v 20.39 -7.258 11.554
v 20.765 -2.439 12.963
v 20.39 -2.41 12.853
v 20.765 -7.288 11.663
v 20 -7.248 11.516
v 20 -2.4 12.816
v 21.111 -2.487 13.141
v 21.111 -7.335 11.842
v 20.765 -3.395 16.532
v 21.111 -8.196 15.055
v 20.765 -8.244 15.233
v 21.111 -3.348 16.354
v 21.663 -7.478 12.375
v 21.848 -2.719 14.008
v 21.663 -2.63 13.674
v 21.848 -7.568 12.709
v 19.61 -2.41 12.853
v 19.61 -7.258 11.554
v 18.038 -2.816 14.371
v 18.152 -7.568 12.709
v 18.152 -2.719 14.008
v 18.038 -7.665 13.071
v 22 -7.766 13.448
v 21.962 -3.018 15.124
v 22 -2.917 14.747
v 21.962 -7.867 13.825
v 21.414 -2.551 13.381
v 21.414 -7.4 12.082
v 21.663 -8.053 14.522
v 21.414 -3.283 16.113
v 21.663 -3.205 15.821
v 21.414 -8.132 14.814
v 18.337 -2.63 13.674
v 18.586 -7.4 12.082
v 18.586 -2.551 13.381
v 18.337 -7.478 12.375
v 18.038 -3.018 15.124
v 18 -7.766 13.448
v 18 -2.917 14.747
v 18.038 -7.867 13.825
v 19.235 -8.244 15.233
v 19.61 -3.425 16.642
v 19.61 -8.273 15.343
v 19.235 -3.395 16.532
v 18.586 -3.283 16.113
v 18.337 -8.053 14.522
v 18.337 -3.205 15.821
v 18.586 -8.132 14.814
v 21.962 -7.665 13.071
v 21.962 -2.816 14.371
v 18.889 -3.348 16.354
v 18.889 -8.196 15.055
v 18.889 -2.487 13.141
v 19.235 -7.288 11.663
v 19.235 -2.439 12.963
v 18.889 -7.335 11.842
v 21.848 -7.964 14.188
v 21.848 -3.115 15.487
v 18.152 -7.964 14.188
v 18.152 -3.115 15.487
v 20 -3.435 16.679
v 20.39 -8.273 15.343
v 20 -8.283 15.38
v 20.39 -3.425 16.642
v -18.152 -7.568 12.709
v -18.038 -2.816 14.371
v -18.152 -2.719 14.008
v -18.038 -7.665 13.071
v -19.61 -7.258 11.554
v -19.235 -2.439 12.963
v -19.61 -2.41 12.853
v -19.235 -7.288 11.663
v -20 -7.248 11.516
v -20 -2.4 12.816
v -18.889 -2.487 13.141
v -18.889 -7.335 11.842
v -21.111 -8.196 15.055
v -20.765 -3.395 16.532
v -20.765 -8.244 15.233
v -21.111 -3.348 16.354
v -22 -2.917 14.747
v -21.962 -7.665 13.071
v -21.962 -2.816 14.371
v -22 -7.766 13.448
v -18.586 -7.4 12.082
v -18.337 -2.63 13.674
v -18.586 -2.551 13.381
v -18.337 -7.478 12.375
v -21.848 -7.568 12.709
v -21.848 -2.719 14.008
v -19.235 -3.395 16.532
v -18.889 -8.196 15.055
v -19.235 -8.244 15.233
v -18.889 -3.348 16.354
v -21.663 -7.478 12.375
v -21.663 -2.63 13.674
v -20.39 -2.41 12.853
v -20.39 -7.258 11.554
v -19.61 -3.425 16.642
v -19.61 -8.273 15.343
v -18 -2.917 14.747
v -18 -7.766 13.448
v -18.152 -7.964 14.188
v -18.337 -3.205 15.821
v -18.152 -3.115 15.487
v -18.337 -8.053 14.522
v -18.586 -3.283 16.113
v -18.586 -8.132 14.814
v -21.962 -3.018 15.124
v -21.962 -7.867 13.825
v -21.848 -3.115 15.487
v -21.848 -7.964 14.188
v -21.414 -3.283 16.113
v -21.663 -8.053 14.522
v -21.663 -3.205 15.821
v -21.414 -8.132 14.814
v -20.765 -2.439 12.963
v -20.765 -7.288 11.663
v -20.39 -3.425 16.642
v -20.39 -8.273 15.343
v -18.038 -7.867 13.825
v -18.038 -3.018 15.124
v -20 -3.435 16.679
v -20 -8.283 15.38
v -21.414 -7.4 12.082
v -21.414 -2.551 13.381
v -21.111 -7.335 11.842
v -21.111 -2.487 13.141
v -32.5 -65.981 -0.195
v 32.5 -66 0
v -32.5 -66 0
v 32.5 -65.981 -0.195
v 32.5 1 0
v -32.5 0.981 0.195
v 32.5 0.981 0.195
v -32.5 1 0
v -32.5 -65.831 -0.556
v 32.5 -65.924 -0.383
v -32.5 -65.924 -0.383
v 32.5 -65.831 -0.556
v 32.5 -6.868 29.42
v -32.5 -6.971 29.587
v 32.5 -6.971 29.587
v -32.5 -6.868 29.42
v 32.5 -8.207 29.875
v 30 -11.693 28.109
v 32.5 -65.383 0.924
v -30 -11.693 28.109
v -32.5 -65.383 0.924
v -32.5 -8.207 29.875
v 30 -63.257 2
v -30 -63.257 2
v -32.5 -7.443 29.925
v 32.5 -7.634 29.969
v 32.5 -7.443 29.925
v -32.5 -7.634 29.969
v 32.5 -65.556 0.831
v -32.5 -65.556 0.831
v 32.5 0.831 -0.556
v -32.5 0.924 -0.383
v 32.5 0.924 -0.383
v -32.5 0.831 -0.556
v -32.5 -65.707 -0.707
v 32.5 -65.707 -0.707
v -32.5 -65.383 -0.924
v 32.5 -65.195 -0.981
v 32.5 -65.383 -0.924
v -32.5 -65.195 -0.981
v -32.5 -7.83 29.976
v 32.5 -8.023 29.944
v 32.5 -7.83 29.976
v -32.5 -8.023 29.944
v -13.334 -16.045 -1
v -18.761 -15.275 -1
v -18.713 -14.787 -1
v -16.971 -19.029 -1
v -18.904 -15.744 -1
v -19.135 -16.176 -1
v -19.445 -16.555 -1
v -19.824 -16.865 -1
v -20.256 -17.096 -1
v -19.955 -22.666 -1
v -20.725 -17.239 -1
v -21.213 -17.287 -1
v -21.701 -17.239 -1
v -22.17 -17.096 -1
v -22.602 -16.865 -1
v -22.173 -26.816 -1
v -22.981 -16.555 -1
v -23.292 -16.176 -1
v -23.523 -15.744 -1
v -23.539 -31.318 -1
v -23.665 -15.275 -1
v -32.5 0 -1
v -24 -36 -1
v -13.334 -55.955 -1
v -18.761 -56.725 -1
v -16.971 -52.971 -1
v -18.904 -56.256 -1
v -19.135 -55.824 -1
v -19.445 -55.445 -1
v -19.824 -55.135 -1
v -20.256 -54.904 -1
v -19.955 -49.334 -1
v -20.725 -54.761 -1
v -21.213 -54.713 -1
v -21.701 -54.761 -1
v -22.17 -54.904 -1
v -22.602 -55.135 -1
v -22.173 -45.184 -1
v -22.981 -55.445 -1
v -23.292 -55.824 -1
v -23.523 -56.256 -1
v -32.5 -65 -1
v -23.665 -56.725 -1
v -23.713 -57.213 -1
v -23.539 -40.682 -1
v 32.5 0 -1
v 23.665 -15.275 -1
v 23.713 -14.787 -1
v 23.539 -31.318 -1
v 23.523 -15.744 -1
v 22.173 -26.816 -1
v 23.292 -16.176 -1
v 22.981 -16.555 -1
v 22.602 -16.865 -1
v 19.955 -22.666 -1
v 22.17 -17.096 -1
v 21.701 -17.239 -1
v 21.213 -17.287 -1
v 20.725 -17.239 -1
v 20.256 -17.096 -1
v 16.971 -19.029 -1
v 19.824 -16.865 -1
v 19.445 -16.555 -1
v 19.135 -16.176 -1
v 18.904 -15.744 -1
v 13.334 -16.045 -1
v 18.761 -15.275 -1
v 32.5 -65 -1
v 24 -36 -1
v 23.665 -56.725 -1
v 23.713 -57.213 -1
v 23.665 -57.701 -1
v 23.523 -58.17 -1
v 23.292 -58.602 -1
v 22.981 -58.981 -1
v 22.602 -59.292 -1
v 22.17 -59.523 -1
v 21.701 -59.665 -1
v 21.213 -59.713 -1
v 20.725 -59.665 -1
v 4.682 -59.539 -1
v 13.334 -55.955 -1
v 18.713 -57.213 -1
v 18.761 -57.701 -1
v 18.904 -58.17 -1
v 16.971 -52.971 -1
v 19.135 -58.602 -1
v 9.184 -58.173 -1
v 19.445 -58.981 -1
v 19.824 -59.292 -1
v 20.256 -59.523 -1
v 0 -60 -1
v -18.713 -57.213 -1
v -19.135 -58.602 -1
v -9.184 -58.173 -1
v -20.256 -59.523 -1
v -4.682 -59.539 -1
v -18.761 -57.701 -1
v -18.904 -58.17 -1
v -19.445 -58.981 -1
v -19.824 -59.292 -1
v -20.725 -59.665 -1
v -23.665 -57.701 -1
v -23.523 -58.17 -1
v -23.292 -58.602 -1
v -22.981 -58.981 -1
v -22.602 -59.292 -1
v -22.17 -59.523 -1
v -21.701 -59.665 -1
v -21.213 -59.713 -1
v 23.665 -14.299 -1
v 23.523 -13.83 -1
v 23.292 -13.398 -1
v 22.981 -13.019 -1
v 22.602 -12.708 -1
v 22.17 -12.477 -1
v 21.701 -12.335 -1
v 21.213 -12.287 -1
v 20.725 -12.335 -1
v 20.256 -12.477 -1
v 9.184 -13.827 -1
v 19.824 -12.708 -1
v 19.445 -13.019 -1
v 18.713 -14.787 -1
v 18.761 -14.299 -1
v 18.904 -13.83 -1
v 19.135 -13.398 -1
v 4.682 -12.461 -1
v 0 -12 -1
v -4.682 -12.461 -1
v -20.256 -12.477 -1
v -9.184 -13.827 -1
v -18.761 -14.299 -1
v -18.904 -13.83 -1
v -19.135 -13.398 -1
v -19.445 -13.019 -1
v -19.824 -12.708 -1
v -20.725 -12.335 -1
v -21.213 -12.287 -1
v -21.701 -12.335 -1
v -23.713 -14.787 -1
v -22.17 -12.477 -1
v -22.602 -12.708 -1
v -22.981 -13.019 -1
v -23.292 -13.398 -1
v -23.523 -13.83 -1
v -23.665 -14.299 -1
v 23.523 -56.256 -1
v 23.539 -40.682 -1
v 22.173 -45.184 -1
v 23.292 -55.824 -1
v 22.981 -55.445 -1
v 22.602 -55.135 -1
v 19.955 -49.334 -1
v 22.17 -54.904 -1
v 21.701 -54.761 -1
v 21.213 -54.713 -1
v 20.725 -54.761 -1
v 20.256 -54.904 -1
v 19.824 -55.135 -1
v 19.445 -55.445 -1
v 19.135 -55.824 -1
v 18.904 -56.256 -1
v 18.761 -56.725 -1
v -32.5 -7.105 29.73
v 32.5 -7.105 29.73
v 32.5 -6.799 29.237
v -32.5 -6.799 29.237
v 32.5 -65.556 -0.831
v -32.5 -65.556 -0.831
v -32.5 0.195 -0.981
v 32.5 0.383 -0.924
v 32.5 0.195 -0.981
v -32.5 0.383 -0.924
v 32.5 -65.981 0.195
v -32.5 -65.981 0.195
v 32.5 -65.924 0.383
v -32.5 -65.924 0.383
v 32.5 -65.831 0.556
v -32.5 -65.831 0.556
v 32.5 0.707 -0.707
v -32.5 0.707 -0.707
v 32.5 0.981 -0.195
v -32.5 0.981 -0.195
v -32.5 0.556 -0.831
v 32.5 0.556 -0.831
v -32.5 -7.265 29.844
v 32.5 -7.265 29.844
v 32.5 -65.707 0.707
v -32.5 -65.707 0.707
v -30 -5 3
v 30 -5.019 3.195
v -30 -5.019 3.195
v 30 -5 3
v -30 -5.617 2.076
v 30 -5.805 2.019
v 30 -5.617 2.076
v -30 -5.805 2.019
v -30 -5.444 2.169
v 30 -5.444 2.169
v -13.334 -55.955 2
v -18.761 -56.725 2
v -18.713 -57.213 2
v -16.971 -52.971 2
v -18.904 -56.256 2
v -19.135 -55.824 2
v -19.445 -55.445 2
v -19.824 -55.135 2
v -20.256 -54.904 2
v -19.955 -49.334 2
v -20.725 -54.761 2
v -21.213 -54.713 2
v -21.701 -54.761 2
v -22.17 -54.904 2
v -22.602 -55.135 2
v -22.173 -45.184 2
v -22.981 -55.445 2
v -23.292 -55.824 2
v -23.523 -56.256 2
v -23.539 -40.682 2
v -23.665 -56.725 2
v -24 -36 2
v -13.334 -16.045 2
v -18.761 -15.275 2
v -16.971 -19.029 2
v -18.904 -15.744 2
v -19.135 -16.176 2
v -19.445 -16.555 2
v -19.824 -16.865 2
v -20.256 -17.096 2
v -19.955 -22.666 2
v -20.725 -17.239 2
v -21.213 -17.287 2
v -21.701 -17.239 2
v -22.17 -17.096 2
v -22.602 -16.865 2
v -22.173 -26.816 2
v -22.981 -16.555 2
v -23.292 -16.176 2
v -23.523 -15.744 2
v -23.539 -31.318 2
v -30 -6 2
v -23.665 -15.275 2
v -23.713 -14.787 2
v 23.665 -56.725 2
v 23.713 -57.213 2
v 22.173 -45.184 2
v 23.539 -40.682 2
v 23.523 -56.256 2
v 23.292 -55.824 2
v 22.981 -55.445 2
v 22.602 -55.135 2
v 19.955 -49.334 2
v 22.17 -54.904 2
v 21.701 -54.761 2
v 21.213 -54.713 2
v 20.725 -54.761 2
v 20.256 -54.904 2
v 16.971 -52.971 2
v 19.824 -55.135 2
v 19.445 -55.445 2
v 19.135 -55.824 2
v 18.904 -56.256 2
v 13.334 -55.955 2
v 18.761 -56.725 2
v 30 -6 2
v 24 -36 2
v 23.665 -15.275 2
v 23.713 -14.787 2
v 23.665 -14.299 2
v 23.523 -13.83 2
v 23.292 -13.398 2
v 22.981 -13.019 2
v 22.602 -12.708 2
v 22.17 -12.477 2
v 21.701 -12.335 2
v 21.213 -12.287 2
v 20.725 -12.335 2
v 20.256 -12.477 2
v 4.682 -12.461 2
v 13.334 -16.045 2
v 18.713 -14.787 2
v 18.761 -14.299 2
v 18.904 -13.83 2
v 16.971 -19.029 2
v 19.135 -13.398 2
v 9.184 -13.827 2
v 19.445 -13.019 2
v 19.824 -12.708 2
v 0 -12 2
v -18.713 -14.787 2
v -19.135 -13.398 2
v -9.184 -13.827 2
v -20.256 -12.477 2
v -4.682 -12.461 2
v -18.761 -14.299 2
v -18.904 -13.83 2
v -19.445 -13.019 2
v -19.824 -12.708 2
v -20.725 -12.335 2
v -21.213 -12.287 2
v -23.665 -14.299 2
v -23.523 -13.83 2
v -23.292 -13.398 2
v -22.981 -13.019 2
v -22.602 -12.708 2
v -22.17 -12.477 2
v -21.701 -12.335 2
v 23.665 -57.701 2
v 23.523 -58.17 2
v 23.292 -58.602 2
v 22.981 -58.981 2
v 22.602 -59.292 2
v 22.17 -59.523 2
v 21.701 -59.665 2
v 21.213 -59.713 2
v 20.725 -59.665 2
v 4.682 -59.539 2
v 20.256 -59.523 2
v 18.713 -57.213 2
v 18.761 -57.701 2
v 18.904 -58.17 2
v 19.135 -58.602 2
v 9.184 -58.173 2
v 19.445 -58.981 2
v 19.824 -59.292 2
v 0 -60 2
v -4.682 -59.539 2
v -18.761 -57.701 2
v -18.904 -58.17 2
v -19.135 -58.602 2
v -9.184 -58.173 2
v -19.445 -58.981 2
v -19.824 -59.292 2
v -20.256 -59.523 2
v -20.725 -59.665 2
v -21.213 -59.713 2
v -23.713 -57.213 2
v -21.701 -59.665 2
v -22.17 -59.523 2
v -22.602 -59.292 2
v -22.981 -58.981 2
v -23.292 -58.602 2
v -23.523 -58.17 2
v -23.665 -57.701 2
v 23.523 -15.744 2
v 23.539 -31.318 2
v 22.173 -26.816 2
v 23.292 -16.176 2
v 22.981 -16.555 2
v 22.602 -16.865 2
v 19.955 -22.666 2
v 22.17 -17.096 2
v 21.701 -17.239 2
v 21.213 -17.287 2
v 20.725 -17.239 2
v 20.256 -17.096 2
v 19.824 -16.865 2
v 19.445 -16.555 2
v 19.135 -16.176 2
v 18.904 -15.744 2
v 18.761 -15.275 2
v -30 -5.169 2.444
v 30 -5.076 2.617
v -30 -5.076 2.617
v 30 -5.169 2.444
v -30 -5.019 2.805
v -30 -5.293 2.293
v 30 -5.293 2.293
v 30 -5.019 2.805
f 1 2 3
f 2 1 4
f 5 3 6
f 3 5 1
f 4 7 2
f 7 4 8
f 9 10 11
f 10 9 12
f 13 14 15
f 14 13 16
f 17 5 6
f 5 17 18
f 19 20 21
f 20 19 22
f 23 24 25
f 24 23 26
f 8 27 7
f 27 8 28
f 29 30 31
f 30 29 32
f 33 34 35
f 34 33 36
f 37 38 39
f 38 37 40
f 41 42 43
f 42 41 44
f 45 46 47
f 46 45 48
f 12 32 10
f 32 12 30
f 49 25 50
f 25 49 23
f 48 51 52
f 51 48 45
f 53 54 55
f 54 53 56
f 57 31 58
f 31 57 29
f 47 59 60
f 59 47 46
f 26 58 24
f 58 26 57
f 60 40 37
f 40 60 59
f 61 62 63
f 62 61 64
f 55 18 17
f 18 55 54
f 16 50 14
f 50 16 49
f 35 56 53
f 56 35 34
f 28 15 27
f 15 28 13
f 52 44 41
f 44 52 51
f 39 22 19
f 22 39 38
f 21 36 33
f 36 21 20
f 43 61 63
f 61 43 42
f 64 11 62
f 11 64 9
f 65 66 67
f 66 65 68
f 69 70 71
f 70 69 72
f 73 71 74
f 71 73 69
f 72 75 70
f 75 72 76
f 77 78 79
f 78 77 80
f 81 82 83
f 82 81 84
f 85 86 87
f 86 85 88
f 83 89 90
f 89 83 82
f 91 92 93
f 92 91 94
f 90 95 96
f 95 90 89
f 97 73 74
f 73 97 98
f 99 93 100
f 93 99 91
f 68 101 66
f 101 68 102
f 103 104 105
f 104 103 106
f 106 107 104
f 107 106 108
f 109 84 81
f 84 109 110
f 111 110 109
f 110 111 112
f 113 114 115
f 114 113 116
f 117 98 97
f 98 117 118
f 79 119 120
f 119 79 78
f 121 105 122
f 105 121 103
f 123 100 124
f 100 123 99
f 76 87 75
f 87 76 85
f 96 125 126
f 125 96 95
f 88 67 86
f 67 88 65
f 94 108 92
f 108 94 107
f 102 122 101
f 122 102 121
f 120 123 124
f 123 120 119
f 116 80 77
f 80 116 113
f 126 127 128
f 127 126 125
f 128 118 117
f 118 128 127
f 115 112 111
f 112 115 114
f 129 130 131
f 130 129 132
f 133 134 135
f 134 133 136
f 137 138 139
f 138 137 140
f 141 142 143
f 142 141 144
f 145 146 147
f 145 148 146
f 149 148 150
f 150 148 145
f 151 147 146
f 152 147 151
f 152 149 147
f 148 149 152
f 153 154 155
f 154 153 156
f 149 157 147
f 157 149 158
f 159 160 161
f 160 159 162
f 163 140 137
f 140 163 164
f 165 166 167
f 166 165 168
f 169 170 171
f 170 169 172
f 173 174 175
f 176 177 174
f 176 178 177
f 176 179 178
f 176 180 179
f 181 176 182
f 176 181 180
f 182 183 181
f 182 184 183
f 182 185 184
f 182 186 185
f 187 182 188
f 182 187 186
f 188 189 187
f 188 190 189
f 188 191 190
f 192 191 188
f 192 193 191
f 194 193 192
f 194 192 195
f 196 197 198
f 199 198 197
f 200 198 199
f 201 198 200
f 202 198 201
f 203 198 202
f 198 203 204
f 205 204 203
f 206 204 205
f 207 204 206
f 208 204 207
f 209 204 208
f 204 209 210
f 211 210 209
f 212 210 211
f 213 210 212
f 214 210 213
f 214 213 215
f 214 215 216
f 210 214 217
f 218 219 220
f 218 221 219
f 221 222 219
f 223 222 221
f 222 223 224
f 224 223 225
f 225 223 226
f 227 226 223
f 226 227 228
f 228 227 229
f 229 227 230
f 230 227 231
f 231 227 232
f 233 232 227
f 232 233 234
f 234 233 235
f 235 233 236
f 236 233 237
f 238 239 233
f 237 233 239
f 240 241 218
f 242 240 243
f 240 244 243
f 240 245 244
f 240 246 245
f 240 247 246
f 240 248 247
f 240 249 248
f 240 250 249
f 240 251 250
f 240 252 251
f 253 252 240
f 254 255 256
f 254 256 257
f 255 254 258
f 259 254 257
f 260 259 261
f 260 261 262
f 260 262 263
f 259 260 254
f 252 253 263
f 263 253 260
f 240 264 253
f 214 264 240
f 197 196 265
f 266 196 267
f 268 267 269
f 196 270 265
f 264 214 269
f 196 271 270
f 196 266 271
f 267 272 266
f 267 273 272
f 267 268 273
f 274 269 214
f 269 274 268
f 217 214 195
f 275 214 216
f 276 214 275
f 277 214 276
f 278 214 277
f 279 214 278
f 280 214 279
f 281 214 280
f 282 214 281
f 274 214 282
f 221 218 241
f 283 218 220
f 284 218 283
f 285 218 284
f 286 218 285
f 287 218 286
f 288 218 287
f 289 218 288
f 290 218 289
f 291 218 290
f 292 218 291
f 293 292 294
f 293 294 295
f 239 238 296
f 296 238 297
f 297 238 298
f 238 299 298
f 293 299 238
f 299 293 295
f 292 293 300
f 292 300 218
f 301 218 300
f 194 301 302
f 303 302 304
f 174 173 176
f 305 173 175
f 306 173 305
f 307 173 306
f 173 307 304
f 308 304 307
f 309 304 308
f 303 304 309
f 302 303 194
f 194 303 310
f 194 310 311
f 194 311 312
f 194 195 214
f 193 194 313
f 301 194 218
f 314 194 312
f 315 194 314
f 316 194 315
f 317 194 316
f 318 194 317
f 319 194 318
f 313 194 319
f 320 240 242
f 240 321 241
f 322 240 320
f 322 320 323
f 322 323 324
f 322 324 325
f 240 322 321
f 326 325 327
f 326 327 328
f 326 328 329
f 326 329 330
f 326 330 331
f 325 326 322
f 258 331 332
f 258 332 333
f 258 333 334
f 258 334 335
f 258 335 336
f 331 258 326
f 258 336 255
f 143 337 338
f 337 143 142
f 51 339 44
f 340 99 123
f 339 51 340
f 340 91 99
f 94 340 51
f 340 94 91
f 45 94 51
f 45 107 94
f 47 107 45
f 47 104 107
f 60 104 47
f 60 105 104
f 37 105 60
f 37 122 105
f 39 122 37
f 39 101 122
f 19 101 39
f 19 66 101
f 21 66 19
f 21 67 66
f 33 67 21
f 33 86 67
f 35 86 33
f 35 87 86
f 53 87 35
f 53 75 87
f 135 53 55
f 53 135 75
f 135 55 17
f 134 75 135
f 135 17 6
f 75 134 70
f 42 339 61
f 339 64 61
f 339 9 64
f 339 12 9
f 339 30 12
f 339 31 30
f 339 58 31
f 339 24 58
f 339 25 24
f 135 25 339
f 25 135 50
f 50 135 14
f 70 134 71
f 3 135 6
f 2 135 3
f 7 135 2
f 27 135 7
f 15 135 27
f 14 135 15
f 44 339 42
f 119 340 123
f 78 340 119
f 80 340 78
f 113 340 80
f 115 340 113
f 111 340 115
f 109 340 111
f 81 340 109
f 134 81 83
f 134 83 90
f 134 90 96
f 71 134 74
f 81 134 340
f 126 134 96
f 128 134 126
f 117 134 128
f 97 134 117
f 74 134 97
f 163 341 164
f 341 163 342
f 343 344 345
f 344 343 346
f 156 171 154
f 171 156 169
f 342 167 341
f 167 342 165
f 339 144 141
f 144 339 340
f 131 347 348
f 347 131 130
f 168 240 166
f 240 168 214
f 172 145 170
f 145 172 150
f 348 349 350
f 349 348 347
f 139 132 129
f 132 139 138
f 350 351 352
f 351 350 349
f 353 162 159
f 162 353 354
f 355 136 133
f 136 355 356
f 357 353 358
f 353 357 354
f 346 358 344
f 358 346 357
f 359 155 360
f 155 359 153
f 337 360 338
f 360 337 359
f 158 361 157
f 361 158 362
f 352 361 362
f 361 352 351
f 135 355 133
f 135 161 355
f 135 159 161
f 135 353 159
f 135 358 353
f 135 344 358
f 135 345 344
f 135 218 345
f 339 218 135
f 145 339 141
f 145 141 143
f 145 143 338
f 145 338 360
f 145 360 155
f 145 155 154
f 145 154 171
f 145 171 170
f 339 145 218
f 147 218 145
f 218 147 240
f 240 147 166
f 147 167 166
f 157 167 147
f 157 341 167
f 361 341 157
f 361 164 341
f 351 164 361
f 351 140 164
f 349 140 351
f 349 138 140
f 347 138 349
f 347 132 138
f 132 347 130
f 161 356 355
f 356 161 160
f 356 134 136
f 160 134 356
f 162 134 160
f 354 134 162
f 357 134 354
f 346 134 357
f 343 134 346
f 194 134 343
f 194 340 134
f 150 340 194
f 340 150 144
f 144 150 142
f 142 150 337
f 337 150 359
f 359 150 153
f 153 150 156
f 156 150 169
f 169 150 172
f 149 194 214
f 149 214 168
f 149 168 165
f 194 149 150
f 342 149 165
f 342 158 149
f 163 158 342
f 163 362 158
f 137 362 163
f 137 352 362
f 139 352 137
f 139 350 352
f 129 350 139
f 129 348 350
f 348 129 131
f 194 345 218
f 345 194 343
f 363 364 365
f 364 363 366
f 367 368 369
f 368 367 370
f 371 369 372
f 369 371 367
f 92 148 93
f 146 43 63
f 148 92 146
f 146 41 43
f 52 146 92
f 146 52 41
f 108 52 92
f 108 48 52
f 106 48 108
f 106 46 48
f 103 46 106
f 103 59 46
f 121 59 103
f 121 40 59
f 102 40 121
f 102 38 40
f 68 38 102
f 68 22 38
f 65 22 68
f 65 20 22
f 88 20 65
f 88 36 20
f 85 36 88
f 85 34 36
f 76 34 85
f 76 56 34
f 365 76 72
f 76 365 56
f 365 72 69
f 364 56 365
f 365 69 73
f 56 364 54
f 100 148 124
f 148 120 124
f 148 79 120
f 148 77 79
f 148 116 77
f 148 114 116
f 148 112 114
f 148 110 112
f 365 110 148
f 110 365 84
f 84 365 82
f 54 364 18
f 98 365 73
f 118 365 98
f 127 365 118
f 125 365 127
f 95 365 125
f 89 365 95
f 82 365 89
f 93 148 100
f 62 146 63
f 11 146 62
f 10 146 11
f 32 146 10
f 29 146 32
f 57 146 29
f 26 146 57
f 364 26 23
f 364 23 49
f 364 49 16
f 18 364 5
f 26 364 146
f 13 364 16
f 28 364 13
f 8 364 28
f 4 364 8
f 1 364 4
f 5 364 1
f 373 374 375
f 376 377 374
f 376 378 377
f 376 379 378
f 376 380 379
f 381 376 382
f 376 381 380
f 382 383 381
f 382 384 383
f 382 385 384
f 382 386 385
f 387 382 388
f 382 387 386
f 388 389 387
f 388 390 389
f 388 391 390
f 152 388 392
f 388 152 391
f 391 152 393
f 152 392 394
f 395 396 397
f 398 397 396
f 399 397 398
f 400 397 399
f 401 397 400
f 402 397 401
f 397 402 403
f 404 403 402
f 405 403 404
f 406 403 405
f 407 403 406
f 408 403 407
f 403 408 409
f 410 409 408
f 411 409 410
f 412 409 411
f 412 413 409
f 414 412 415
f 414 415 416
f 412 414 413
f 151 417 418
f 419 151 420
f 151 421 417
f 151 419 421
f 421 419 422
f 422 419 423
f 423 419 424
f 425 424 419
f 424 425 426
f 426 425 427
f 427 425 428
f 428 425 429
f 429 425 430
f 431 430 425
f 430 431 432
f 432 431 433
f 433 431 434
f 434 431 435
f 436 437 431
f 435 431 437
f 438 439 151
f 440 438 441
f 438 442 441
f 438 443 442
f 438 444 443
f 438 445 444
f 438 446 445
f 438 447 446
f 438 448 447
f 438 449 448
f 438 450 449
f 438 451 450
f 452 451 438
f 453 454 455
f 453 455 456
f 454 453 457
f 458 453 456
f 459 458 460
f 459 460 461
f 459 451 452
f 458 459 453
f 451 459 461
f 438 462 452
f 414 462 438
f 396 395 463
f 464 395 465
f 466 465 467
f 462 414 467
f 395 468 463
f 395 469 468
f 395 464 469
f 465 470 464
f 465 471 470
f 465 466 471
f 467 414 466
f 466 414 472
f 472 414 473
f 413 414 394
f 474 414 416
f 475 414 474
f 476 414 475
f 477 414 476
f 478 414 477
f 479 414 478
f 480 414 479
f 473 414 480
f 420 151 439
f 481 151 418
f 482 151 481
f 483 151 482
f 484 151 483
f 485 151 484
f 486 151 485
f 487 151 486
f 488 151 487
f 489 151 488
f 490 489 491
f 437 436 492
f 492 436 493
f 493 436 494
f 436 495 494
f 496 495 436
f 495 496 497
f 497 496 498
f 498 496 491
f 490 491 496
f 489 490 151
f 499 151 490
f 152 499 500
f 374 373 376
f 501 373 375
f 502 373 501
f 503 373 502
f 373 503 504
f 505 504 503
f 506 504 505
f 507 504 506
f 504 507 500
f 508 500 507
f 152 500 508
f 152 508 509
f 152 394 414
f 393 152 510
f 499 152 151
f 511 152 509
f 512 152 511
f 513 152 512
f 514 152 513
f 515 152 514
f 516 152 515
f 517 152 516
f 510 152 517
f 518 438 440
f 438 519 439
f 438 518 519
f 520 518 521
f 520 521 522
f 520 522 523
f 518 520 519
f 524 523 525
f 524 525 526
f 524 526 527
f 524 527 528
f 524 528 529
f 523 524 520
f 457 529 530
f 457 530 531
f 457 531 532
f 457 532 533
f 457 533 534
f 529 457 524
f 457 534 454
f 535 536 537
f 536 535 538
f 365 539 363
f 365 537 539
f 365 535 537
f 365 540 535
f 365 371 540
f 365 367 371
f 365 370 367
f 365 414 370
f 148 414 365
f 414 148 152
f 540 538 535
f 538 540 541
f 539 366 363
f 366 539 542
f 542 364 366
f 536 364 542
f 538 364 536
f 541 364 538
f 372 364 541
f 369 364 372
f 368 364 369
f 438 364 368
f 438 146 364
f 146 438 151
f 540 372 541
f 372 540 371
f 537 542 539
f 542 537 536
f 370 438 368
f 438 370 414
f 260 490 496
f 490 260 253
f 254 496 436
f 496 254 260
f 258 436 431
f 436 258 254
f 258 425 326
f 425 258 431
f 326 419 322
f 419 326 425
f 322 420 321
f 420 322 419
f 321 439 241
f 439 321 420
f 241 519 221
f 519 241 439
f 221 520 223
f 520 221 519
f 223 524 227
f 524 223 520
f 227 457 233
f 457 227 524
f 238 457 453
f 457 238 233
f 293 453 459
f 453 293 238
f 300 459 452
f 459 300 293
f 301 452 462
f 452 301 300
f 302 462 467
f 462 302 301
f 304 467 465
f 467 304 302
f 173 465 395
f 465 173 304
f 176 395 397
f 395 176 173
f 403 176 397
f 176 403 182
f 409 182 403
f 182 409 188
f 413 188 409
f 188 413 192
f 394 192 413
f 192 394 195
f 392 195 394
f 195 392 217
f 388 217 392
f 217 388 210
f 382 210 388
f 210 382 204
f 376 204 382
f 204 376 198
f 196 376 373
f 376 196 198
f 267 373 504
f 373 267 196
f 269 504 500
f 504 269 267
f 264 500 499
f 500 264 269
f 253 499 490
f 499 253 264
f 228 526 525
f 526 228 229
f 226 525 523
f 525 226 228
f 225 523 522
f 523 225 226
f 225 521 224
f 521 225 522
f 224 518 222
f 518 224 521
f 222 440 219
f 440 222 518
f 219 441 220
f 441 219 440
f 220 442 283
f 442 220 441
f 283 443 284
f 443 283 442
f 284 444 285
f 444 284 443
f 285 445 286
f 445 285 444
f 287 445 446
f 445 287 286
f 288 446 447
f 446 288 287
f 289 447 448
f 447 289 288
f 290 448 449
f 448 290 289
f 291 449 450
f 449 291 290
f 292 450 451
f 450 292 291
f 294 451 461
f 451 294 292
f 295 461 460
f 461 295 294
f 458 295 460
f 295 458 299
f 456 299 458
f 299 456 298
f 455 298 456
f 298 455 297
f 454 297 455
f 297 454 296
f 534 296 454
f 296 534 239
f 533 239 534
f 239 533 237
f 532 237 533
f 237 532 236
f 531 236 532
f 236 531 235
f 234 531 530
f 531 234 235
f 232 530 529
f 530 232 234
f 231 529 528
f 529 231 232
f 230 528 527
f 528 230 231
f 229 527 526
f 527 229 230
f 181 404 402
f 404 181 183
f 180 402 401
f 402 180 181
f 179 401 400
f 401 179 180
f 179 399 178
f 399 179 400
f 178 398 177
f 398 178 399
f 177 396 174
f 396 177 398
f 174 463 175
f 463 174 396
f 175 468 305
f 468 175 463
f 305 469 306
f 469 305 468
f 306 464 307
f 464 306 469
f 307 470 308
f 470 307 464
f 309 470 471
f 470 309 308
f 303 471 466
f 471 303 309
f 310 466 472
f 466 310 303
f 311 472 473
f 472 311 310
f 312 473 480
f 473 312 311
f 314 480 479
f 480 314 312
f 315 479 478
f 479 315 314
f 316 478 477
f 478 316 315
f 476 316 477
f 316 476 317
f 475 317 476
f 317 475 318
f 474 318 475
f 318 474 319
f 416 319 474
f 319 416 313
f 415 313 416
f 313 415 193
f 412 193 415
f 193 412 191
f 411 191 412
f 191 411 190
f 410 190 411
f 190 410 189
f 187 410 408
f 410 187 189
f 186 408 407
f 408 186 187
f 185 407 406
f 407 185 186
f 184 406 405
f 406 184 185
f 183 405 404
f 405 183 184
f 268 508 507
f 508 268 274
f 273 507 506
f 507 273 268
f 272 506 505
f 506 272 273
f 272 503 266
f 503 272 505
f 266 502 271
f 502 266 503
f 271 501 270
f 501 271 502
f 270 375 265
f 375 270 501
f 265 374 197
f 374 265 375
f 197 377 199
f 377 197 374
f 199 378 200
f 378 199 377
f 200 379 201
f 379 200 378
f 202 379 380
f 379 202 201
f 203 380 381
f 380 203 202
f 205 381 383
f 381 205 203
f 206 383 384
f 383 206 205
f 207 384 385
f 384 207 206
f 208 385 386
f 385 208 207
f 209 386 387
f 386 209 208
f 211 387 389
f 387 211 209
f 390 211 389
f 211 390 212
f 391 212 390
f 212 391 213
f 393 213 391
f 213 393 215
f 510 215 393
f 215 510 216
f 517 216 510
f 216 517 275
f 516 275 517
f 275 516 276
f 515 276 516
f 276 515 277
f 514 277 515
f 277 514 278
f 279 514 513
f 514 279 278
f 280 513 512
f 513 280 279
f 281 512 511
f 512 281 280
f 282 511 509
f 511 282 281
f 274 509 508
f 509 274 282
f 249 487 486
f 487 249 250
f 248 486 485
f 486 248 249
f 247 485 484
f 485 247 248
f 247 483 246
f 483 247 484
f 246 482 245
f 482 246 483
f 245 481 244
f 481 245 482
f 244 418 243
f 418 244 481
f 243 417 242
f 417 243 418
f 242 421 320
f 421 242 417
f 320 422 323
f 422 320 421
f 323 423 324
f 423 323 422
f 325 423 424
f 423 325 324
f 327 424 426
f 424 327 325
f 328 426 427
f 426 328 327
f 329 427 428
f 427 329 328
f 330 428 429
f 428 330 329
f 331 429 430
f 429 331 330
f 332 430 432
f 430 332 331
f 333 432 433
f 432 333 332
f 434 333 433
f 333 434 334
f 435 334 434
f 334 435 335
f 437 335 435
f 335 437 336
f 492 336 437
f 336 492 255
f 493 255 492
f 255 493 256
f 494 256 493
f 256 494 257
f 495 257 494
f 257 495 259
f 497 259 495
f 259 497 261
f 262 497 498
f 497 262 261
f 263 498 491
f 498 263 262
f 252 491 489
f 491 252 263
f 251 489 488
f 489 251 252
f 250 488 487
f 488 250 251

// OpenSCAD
$fn = 32;

module MountTriangle(base, length, angle)
{
  linear_extrude(base, center=true)
  {
    hull()
    {
      circle(r=1);

      translate([base, 0, 0])
      {
        circle(r=1);
      }

      rotate([0, 0, -angle])
      {
        translate([0, length, 0])
        {
          circle(r=1);
        }
      }
    }
  }
}

module AngledMount(base, length, angle)
{
  difference()
  {
    MountTriangle(base, length, angle);

    translate([6, 3, 0])
    {
      MountTriangle(base - 5, length, angle);
    }

    rotate([0,0,  -90-angle])
    {
      for(x=[-20, 20])
      {
        translate([-length / 2, 0, x])
        {
          rotate([-90, 0, 0])
          {
            cylinder(h=10, d=4, center=true);
          }
        }
      }
    }
  }
}

module SpeakerCutout()
{
  circle(d=48);

  for(a=[45,135,225,315])
  {
    rotate([0, 0, a])
    {
      translate([30, 0])
      {
        circle(d=5);
      }
    }
  }
}

difference()
{
  rotate([0, -90, 0])
  {
    rotate([0, 0, -90])
    {
      AngledMount(65, 30, 15);
    }
  }

  translate([0, -36, -5])
  {
    linear_extrude(10)
    {
      SpeakerCutout();
    }
  }
}
